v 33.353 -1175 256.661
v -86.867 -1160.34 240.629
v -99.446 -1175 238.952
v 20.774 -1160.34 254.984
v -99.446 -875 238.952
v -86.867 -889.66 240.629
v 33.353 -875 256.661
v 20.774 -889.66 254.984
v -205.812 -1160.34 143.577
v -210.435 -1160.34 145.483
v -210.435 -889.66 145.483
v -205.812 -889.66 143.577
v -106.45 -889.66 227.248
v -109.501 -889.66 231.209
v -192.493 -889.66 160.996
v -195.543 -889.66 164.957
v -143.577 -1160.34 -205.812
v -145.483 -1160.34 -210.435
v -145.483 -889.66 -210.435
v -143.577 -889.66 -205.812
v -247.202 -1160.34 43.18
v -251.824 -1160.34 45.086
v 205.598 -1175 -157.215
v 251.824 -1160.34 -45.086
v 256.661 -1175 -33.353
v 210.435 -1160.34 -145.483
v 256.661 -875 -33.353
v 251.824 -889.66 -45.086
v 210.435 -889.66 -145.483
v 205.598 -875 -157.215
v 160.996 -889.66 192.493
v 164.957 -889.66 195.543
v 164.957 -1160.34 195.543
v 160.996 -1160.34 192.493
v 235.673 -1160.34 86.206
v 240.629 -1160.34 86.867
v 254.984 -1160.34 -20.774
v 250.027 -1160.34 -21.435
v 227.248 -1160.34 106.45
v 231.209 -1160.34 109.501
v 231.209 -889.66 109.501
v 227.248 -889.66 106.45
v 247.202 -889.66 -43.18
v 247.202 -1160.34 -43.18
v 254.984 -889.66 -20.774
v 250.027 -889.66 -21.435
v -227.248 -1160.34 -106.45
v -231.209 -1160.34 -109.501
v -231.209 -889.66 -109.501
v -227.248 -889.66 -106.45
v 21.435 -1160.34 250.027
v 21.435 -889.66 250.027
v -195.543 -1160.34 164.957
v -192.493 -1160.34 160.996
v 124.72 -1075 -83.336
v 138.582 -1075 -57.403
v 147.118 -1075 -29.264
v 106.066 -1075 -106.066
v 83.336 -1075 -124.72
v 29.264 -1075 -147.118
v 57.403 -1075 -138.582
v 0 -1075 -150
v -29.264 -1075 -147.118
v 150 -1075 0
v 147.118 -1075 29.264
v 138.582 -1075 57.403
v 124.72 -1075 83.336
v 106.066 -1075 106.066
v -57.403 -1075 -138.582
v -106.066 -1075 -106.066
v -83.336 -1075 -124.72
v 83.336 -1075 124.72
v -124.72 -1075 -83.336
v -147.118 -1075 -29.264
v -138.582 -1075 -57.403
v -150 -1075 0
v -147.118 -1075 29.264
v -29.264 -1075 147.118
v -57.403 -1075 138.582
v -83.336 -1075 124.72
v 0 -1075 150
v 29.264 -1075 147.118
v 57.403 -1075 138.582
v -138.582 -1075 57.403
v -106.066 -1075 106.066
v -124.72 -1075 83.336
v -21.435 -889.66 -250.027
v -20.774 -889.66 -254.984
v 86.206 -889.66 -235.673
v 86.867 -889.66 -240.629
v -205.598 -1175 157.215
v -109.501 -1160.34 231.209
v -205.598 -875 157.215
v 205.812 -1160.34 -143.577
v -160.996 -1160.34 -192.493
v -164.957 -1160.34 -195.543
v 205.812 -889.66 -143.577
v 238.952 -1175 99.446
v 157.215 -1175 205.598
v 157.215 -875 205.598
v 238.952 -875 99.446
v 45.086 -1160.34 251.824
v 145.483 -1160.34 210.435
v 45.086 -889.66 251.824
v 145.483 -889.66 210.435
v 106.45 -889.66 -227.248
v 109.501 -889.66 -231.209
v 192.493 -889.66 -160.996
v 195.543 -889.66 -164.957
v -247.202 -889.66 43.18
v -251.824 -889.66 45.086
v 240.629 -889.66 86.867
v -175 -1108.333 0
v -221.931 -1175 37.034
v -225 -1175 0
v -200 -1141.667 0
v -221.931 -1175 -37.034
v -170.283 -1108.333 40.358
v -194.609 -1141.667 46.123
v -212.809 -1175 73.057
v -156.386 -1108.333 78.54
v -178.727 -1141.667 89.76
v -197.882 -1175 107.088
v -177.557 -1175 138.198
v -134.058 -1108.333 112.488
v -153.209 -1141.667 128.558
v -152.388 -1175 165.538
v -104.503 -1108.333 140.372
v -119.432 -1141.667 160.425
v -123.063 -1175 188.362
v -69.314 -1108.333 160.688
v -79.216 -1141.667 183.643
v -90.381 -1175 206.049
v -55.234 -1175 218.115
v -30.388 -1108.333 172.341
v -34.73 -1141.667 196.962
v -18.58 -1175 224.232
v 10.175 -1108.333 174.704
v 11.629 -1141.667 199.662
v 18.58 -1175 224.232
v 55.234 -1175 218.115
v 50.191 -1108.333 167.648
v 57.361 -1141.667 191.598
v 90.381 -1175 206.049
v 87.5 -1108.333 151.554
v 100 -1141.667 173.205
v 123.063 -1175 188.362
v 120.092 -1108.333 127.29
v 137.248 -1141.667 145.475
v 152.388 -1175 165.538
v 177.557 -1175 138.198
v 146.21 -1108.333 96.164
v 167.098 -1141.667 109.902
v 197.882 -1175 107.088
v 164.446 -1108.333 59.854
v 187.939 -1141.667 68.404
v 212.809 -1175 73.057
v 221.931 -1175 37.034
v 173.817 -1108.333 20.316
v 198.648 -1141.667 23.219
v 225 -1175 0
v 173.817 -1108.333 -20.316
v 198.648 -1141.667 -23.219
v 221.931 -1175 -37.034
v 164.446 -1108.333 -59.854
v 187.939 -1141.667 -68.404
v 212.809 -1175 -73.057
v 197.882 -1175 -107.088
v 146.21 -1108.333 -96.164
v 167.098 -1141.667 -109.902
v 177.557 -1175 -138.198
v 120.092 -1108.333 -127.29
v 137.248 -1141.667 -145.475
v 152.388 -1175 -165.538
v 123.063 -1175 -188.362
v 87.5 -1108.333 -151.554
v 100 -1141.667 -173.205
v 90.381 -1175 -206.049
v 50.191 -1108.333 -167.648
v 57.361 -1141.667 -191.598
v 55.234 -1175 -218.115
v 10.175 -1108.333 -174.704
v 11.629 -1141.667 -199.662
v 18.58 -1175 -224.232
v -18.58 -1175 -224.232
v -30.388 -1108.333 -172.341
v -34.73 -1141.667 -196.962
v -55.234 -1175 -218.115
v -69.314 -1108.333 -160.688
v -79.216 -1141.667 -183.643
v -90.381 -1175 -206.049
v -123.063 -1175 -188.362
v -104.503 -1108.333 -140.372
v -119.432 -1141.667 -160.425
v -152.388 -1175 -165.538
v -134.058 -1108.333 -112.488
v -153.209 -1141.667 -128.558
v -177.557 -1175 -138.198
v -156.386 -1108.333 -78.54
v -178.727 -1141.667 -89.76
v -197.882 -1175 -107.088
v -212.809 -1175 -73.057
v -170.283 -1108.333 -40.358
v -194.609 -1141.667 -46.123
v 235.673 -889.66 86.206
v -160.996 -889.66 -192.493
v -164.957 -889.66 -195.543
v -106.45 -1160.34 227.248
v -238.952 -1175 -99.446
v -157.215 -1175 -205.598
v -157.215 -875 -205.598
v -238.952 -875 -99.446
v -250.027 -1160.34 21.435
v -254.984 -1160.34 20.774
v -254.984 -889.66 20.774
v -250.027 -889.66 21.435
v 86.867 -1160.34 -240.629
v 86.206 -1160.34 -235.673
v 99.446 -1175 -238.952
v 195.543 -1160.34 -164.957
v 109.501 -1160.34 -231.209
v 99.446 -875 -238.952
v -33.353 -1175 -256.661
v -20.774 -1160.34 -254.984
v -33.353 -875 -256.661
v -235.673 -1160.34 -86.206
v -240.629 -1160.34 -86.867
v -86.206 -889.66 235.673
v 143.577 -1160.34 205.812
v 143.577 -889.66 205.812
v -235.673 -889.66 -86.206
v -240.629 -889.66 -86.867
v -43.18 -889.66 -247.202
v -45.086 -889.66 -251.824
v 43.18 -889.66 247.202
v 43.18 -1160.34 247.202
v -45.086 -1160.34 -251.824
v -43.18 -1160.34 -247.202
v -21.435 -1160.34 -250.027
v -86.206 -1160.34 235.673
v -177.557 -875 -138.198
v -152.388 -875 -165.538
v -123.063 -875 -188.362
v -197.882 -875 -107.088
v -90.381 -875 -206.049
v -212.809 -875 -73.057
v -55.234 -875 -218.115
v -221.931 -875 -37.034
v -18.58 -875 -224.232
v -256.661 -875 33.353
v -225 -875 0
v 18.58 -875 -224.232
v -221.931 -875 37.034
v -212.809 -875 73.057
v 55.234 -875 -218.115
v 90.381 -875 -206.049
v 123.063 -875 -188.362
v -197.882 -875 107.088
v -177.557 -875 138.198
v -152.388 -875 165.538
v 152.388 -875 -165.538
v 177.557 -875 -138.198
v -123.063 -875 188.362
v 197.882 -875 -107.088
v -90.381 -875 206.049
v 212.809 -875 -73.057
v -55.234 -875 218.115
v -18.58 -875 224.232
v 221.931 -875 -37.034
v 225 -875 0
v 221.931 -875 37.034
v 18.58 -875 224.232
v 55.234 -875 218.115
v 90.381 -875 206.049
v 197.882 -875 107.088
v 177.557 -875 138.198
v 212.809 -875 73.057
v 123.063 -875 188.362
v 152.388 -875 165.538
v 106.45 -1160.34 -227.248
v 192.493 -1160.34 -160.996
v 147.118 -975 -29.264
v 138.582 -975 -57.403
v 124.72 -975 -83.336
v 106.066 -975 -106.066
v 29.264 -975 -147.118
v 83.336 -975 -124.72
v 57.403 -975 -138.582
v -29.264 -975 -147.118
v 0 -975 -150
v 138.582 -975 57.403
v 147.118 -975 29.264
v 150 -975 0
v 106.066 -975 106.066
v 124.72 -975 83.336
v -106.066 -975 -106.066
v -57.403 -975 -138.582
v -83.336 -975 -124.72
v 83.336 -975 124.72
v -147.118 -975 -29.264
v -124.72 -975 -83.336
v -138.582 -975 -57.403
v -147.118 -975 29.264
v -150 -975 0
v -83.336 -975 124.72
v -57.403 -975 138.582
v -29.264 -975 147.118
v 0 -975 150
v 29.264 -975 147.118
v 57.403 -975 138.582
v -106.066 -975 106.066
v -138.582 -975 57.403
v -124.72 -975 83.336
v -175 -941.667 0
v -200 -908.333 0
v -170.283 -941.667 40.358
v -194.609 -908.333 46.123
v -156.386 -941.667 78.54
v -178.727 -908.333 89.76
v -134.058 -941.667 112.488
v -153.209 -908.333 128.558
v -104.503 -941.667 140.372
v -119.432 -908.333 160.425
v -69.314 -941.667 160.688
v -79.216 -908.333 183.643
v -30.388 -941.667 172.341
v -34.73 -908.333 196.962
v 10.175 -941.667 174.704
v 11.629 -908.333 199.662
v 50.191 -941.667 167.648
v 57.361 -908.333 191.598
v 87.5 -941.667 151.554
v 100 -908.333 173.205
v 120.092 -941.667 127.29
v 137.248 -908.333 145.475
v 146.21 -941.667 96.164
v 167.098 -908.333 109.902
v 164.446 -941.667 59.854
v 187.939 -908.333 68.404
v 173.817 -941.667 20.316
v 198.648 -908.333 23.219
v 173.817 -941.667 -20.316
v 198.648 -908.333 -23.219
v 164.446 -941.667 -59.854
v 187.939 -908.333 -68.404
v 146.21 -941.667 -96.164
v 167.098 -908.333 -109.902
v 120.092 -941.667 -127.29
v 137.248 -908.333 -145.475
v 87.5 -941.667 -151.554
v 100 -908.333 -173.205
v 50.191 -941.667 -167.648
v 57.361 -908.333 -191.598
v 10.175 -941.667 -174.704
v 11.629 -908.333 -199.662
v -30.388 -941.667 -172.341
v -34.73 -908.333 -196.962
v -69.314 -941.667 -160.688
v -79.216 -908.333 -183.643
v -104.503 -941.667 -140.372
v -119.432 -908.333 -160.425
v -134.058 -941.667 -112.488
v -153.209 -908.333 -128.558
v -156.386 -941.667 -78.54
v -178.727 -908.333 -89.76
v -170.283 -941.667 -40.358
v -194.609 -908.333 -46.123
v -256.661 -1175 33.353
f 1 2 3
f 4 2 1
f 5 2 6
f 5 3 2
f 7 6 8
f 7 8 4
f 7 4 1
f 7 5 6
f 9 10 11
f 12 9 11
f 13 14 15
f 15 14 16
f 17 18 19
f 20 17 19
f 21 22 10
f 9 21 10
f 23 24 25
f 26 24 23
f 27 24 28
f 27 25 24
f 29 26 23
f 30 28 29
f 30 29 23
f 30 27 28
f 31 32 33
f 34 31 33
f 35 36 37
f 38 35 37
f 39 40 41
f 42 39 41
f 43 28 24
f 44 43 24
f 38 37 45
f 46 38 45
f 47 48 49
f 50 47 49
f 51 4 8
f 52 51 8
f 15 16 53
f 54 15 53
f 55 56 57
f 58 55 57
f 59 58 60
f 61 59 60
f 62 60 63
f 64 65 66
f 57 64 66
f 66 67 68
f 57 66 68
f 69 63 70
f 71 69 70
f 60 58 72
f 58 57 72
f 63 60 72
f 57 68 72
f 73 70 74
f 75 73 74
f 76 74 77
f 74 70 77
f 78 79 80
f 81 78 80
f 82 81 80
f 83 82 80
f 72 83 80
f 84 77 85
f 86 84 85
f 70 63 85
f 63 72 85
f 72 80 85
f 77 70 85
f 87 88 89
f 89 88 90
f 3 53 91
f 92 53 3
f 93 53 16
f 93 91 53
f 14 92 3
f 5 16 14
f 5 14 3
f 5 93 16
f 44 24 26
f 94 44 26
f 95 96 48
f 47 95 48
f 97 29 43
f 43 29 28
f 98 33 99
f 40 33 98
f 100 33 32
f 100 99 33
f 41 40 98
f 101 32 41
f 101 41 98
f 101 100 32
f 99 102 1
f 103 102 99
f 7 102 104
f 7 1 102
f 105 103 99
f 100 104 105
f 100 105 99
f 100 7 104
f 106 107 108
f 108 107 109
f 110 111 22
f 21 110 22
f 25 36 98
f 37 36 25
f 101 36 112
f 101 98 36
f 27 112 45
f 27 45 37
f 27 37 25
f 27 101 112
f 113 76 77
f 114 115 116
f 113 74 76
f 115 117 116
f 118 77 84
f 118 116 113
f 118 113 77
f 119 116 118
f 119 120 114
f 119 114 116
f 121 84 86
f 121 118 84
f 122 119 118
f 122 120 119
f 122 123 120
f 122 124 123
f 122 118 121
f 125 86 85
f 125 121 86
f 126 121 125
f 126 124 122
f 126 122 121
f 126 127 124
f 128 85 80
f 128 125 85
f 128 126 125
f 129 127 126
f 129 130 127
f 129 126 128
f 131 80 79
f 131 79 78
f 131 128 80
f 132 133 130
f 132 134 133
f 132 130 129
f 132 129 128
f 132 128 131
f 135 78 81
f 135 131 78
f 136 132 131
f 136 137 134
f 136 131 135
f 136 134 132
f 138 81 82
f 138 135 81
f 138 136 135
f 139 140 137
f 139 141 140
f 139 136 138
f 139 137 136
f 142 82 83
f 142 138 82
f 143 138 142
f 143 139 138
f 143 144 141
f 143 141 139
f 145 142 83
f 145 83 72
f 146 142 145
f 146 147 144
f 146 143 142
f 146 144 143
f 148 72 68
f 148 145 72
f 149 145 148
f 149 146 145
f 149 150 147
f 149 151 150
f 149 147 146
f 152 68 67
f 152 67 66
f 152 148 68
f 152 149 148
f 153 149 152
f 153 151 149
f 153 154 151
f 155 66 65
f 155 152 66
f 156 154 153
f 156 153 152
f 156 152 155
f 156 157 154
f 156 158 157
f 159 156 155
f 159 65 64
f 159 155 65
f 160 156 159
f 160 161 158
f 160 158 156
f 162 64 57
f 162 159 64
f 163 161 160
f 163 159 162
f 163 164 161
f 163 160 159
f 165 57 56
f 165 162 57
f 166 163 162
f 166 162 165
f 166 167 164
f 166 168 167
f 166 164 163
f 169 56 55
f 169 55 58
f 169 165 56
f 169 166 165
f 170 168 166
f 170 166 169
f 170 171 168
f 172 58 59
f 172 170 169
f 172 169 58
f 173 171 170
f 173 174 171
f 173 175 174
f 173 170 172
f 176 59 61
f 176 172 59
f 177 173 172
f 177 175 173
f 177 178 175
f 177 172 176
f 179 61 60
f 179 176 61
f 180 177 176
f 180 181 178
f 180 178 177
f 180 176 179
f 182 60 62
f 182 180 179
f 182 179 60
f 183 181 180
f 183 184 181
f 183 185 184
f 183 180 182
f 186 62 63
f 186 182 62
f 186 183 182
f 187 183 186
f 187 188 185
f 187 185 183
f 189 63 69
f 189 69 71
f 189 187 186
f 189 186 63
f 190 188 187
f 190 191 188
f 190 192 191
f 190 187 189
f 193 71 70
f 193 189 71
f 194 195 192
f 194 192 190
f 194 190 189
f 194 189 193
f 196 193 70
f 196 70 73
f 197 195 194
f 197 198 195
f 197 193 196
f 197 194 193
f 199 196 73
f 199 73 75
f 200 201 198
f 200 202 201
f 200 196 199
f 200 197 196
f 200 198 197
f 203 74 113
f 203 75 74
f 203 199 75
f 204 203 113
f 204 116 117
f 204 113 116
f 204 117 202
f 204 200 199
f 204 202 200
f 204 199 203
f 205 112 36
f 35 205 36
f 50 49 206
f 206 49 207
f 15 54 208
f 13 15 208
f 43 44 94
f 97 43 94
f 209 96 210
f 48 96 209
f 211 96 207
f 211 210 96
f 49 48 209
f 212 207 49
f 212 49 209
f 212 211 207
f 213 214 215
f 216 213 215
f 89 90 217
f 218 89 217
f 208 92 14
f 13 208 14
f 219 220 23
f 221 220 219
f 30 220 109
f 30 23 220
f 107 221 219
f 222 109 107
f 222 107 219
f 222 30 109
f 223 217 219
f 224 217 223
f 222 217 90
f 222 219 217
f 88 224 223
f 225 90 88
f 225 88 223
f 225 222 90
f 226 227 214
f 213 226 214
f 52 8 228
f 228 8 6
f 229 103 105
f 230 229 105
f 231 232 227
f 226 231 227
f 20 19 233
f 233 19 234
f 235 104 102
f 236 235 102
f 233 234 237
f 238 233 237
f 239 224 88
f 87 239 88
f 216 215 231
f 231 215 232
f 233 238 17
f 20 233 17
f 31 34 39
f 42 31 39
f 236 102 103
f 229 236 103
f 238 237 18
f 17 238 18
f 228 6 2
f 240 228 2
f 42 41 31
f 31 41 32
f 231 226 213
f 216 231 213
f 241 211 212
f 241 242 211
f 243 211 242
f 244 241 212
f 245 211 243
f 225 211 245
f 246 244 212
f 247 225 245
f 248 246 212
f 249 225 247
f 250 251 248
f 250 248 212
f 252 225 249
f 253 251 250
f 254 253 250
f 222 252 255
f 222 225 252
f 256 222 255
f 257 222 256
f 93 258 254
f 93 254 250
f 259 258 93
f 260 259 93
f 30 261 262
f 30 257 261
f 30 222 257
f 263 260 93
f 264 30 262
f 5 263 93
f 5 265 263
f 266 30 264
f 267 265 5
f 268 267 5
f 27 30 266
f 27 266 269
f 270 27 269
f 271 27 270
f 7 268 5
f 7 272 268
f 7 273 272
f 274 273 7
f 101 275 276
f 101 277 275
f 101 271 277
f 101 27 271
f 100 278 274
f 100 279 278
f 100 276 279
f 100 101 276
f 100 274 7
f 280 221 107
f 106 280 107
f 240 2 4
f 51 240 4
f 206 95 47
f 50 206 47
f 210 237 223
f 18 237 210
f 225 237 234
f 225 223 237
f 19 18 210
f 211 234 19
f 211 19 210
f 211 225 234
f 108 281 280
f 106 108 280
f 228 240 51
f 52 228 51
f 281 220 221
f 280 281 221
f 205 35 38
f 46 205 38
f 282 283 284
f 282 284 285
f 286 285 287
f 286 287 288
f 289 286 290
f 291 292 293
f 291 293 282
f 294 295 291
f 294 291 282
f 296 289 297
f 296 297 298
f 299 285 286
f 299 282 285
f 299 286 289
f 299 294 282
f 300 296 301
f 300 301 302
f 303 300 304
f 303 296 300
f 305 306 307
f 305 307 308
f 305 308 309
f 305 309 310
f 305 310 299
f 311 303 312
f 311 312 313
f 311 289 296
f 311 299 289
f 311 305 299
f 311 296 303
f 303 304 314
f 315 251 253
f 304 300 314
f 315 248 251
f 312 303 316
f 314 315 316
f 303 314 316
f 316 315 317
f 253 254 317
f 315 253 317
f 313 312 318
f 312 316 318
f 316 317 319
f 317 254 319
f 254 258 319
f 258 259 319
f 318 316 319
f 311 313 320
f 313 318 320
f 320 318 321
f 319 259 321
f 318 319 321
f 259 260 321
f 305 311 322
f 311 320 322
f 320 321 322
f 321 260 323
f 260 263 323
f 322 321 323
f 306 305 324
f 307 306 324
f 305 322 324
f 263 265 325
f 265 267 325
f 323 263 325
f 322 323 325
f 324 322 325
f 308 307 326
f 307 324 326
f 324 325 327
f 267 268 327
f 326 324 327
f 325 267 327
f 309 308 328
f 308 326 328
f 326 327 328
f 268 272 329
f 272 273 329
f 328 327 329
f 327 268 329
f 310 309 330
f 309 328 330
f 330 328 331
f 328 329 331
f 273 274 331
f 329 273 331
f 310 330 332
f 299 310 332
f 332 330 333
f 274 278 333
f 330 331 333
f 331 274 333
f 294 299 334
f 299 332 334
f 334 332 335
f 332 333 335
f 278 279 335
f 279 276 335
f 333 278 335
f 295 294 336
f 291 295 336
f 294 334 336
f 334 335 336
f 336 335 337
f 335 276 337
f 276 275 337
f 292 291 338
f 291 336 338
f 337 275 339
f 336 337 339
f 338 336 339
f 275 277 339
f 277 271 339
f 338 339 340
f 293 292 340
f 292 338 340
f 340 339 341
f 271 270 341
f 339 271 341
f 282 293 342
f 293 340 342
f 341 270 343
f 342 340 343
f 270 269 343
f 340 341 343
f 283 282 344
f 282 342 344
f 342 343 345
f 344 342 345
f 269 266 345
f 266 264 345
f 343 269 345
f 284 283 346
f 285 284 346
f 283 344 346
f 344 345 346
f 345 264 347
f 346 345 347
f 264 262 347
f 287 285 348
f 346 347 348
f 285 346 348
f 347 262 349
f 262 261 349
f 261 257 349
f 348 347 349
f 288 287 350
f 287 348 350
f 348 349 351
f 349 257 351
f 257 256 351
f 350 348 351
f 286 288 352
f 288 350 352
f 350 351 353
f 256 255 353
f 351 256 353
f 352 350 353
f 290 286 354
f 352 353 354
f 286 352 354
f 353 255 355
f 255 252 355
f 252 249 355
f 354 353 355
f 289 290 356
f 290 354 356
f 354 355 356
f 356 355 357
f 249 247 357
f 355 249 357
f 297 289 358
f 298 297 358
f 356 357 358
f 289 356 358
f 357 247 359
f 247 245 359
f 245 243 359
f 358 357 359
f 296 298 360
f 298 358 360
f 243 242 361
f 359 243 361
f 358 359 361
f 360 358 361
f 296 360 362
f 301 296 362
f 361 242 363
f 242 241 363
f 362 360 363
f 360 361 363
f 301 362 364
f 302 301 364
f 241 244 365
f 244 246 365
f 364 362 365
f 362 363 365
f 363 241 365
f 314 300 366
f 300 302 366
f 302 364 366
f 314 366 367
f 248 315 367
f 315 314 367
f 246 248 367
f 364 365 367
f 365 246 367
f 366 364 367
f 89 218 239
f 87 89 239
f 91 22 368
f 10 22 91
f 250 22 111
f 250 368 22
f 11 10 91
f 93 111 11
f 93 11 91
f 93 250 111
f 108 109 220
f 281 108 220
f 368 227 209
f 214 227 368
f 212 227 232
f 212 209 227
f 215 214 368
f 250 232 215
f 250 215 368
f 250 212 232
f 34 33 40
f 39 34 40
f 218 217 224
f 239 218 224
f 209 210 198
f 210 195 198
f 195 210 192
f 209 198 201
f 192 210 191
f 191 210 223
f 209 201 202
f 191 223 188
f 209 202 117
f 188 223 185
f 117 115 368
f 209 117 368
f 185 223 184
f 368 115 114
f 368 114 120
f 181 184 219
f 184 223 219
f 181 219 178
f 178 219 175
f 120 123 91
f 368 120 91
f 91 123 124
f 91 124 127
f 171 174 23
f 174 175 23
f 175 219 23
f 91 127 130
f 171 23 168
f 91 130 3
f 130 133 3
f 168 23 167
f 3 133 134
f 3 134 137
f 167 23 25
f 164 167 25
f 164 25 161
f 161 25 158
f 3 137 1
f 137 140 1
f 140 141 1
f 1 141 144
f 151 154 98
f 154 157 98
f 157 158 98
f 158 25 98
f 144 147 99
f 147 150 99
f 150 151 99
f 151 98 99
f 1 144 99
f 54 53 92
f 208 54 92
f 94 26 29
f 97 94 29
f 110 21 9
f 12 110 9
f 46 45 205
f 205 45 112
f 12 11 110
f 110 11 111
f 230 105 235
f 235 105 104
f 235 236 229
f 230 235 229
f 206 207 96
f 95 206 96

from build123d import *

# Parameters (mm, degrees)
SKETCH_1_R               = 90
SKETCH_1_R_2             = 50
EXTRUDE_1_DEPTH          = 50
SKETCH_5_R               = 150
EXTRUDE_2_DEPTH          = 100
SKETCH_6_R               = 150
SKETCH_8_R               = 225
CUT_EXTRUDE_1_DEPTH      = 5
PATTERN_CIRCULAR_1_COUNT = 12


with BuildPart() as part:
    # 草图1 → 凸台-拉伸1 (new, symmetric)
    with BuildSketch(Plane(origin=(0, -1025, 0), x_dir=(-1, 0, 0), z_dir=(0, 1, 0))):
        with Locations(Location((0, 0, 0), (0, 0, 90))):
            Circle(SKETCH_1_R)
        with Locations(Location((0, 0, 0), (0, 0, 90))):
            Circle(SKETCH_1_R_2, mode=Mode.SUBTRACT)
    extrude(amount=EXTRUDE_1_DEPTH, both=True)

    # 草图5 → 凸台-拉伸2 (add)
    with BuildSketch(Plane(origin=(0, -975, 0), x_dir=(-1, 0, 0), z_dir=(0, 1, 0))):
        with Locations(Location((0, 0, 0), (0, 0, 90))):
            Circle(SKETCH_5_R)
    extrude(amount=-EXTRUDE_2_DEPTH)

    # 凸台-拉伸4: read off the stored shape, not the designer's step
    # 凸台-拉伸4: loft between two sections, ruled curve by curve
    extrude_4_from = [
        Edge.make_line((-33.353210676, -1175, -256.660985437), (-157.215220461, -1175, -205.598328211)),
        Edge.make_line((-157.215220461, -1175, -205.598328211), (-238.951538886, -1175, -99.445764975)),
        Edge.make_line((-238.951538886, -1175, -99.445764975), (-256.660985437, -1175, 33.353210676)),
        Edge.make_line((-256.660985437, -1175, 33.353210676), (-205.598328211, -1175, 157.215220461)),
        Edge.make_line((-205.598328211, -1175, 157.215220461), (-99.445764975, -1175, 238.951538886)),
        Edge.make_line((-99.445764975, -1175, 238.951538886), (33.353210676, -1175, 256.660985437)),
        Edge.make_line((33.353210676, -1175, 256.660985437), (157.215220461, -1175, 205.598328211)),
        Edge.make_line((157.215220461, -1175, 205.598328211), (238.951538886, -1175, 99.445764975)),
        Edge.make_line((238.951538886, -1175, 99.445764975), (256.660985437, -1175, -33.353210676)),
        Edge.make_line((256.660985437, -1175, -33.353210676), (205.598328211, -1175, -157.215220461)),
        Edge.make_line((205.598328211, -1175, -157.215220461), (99.445764975, -1175, -238.951538886)),
        Edge.make_line((99.445764975, -1175, -238.951538886), (-33.353210676, -1175, -256.660985437)),
    ]
    extrude_4_to = [
        Edge.make_line((-33.353210676, -875, -256.660985437), (-157.215220461, -875, -205.598328211)),
        Edge.make_line((-157.215220461, -875, -205.598328211), (-238.951538886, -875, -99.445764975)),
        Edge.make_line((-238.951538886, -875, -99.445764975), (-256.660985437, -875, 33.353210676)),
        Edge.make_line((-256.660985437, -875, 33.353210676), (-205.598328211, -875, 157.215220461)),
        Edge.make_line((-205.598328211, -875, 157.215220461), (-99.445764975, -875, 238.951538886)),
        Edge.make_line((-99.445764975, -875, 238.951538886), (33.353210676, -875, 256.660985437)),
        Edge.make_line((33.353210676, -875, 256.660985437), (157.215220461, -875, 205.598328211)),
        Edge.make_line((157.215220461, -875, 205.598328211), (238.951538886, -875, 99.445764975)),
        Edge.make_line((238.951538886, -875, 99.445764975), (256.660985437, -875, -33.353210676)),
        Edge.make_line((256.660985437, -875, -33.353210676), (205.598328211, -875, -157.215220461)),
        Edge.make_line((205.598328211, -875, -157.215220461), (99.445764975, -875, -238.951538886)),
        Edge.make_line((99.445764975, -875, -238.951538886), (-33.353210676, -875, -256.660985437)),
    ]
    extrude_4 = Solid(Shell([*[Face.make_surface_from_curves(extrude_4_from[k], extrude_4_to[k]) for k in range(12)], Face(Wire(extrude_4_from)), Face(Wire(extrude_4_to))]))
    add(extrude_4)

    # 草图6 → 切除-放样3 section 0
    with BuildSketch(Plane(origin=(0, -1075, 0), x_dir=(-1, 0, 0), z_dir=(0, 1, 0))):
        Circle(SKETCH_6_R)
    # 草图8 → 切除-放样3 section 1
    with BuildSketch(Plane(origin=(0, -1175, 0), x_dir=(-1, 0, 0), z_dir=(0, 1, 0))):
        Circle(SKETCH_8_R)
    loft_3 = loft(mode=Mode.SUBTRACT)

    # 镜向2: 切除-放样3 across plane
    add(loft_3.mirror(Plane.ZX.offset(-1025)), mode=Mode.SUBTRACT)

    # 草图9 → 切除-拉伸1 (cut)
    with BuildSketch(Plane(origin=(231.129656824, 0, -95.284215569), x_dir=(-0.3811368622740284, 0, -0.9245186272952581), z_dir=(0.9245186272952581, 0, -0.3811368622740284))):
        Polygon((-54.297116462, -889.659578346), (-54.297116462, -1146.583758404), (54.297116462, -903.416241596), (54.297116462, -889.659578346), align=None)
        Polygon((54.297116462, -903.416241596), (-54.297116462, -1146.583758404), (-54.297116462, -1160.340421654), (54.297116462, -1160.340421654), align=None)
    cut_extrude_1 = extrude(amount=-CUT_EXTRUDE_1_DEPTH, mode=Mode.SUBTRACT)

    # 阵列(圆周)1: 切除-拉伸1 ×12 about axis
    pattern_circular_1_axis = Axis((0, 0, 0), (0, 1, 0))
    for i in range(1, PATTERN_CIRCULAR_1_COUNT):
        add(cut_extrude_1.rotate(pattern_circular_1_axis, i * 360 / PATTERN_CIRCULAR_1_COUNT), mode=Mode.SUBTRACT)


solid = part.part
